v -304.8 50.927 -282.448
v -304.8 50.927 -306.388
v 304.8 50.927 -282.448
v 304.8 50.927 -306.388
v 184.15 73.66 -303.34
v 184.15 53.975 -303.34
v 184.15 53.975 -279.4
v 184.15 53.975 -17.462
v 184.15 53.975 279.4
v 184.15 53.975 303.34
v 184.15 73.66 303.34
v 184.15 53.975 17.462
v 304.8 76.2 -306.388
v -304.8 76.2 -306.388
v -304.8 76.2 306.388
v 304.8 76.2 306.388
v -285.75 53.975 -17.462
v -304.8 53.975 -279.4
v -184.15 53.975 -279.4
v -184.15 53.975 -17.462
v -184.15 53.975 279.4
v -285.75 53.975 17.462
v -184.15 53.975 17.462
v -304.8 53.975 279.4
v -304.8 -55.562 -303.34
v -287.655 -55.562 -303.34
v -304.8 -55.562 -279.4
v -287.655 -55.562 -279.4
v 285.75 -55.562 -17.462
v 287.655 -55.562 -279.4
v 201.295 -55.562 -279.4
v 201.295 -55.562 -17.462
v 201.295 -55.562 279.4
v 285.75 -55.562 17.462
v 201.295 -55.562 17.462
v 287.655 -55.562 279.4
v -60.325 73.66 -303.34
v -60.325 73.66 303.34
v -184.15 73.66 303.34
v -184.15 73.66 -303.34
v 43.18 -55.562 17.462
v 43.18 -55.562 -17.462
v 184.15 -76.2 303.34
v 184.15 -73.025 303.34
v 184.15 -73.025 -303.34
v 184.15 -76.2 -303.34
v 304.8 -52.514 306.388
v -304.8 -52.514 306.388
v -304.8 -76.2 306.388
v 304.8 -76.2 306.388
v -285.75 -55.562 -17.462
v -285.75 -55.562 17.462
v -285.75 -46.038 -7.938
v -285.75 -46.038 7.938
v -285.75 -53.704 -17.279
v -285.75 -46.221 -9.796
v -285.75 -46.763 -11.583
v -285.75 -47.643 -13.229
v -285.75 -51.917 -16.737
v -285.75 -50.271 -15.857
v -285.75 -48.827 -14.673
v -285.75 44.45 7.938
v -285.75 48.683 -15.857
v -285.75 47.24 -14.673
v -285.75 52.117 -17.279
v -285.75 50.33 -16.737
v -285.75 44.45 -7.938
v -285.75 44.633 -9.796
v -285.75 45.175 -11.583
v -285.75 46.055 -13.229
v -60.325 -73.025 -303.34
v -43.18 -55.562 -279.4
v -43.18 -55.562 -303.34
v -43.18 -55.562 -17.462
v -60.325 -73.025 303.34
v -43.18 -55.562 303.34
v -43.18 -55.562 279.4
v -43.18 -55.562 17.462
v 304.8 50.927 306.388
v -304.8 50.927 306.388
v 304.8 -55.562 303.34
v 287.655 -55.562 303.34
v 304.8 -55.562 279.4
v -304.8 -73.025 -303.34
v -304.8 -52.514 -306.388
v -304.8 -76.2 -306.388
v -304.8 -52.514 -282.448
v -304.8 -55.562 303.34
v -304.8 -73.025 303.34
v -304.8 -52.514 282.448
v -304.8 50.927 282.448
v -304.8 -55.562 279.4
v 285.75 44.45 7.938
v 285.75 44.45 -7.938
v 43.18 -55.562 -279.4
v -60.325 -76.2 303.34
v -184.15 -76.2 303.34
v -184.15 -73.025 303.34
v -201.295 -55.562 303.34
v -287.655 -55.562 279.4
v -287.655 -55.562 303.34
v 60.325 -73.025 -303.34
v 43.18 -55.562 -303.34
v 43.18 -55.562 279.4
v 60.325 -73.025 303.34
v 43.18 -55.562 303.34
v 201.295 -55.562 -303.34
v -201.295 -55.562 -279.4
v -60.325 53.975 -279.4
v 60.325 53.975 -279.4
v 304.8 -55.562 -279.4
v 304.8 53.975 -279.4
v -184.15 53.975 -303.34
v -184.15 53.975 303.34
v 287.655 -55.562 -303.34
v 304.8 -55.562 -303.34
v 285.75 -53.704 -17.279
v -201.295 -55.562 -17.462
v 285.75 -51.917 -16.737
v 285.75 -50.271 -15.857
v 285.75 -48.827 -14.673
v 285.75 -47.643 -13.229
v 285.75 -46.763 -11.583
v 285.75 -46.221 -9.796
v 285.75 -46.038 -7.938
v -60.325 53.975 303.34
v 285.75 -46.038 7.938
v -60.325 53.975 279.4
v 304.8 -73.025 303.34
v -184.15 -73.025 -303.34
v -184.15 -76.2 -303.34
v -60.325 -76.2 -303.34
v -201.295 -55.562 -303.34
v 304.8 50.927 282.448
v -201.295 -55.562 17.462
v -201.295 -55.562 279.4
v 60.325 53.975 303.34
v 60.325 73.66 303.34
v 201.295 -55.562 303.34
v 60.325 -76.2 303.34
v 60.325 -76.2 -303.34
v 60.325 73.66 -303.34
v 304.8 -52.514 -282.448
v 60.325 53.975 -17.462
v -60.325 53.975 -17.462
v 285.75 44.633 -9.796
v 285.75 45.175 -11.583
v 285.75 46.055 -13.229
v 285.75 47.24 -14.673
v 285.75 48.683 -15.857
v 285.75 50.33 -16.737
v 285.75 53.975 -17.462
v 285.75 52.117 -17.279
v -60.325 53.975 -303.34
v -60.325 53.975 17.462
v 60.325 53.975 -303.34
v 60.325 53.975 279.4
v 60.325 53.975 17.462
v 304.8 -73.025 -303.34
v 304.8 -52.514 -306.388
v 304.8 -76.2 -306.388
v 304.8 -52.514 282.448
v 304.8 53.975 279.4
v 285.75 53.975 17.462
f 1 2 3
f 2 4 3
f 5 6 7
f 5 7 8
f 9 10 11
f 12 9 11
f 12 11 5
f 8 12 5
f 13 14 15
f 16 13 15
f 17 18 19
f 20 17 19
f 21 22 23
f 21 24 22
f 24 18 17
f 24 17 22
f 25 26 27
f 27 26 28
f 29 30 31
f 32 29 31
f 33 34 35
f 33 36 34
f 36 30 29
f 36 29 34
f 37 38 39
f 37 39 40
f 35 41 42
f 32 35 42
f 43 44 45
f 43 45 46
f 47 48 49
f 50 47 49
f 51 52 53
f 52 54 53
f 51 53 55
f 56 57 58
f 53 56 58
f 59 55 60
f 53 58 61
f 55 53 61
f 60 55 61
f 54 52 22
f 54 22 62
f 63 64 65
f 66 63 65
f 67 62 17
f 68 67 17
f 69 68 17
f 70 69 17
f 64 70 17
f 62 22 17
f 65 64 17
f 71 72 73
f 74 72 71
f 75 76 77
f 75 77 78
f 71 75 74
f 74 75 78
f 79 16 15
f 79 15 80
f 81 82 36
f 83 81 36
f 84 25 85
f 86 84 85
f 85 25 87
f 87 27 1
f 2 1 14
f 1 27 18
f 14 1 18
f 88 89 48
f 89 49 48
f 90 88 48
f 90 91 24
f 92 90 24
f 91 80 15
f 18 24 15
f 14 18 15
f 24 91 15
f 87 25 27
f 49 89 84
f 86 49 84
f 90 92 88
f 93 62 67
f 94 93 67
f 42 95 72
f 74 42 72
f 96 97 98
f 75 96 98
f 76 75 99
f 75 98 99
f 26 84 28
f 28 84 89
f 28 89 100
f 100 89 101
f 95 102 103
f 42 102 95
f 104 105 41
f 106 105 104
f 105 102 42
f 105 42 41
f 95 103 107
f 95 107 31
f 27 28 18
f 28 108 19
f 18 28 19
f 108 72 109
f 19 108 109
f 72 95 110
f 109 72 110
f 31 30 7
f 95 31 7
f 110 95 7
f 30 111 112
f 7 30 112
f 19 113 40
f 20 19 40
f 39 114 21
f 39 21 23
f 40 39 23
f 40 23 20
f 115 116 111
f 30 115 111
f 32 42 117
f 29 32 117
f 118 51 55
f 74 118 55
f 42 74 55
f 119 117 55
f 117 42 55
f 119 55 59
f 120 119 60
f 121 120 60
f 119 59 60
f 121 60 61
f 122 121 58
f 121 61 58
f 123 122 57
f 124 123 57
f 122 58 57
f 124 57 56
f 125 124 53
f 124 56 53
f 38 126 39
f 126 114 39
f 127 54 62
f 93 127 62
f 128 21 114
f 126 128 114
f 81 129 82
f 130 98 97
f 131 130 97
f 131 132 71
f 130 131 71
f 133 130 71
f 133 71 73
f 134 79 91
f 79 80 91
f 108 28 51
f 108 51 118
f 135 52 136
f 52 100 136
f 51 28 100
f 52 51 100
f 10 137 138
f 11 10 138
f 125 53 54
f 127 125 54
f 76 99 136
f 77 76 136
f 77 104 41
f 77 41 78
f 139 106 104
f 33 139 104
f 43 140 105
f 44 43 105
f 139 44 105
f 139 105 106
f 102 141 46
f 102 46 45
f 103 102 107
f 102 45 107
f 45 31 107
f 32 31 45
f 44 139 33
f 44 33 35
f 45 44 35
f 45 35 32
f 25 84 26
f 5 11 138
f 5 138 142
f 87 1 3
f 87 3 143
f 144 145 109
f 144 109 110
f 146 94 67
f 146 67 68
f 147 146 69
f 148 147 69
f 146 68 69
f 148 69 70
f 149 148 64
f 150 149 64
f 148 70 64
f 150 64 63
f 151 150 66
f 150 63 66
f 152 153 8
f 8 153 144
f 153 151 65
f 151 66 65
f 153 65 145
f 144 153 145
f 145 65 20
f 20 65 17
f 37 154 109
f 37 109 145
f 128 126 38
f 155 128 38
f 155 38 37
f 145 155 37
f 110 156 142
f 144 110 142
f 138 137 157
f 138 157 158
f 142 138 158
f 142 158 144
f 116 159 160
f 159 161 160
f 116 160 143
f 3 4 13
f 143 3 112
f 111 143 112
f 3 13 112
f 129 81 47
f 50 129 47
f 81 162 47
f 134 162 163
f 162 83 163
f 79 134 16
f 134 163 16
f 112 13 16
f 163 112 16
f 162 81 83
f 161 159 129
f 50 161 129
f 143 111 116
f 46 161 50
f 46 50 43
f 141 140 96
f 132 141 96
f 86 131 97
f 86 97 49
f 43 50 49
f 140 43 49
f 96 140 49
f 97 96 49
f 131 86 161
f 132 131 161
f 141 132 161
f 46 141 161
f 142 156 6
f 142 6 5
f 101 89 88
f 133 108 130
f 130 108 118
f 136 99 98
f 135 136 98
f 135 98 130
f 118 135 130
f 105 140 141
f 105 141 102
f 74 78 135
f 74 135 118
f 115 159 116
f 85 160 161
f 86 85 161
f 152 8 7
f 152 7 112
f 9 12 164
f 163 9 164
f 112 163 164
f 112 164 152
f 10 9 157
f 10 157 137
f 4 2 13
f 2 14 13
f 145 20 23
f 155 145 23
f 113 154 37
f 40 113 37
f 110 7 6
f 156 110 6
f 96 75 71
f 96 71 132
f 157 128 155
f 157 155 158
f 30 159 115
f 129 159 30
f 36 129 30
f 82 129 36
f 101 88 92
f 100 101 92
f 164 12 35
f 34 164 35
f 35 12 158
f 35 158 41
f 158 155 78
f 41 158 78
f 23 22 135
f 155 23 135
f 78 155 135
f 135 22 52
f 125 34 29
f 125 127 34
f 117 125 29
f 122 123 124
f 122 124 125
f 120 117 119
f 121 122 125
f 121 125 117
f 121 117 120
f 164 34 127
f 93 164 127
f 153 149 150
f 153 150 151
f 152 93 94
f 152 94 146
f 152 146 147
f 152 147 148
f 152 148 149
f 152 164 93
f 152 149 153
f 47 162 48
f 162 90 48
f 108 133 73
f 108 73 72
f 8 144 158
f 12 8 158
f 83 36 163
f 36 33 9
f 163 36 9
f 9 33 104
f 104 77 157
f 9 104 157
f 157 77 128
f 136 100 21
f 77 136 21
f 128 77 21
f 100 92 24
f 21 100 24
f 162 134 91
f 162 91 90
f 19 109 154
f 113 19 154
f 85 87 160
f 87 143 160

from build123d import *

# Parameters (mm, degrees)
BOSS_EXTRUDE1_DEPTH      = 306.3875
BOSS_EXTRUDE1_2_DEPTH    = 306.3875
BOSS_EXTRUDE1_3_DEPTH    = 306.3875
SKETCH3_W                = 120.65
SKETCH3_H                = 19.685
BOSS_EXTRUDE1_4_DEPTH    = 306.3875
LPATTERN1_COUNT          = 3
LPATTERN1_PITCH          = 244.475
BOSS_EXTRUDE2_DEPTH      = 304.8
SKETCH5_W                = 606.679
SKETCH5_H                = 2.54
BOSS_EXTRUDE3_DEPTH      = 609.6
BOSS_EXTRUDE4_DEPTH      = 285.75
BOSS_EXTRUDE4_DEPTH_BACK = 285.75


with BuildPart() as part:
    # Sketch3 → Boss-Extrude1 (new, symmetric)
    with BuildSketch(Plane.XY):
        Polygon((-304.8, -76.2), (-304.8, -73.025), (-287.655, -55.5625), (-201.295, -55.5625), (-184.15, -73.025), (-184.15, -76.2), align=None)
    extrude(amount=BOSS_EXTRUDE1_DEPTH, both=True)



with BuildPart() as body_2:
    # Sketch3 → Boss-Extrude1 2 (new, symmetric)
    with BuildSketch(Plane.XY):
        Polygon((184.15, -73.025), (184.15, -76.2), (304.8, -76.2), (304.8, -73.025), (287.655, -55.5625), (201.295, -55.5625), align=None)
    extrude(amount=BOSS_EXTRUDE1_2_DEPTH, both=True)


with BuildPart() as body_3:
    # Sketch3 → Boss-Extrude1 3 (new, symmetric)
    with BuildSketch(Plane.XY):
        Polygon((-60.325, -76.2), (60.325, -76.2), (60.325, -73.025), (43.18, -55.5625), (-43.18, -55.5625), (-60.325, -73.025), align=None)
    extrude(amount=BOSS_EXTRUDE1_3_DEPTH, both=True)


with BuildPart() as body_4:
    # Sketch3 → Boss-Extrude1 4 (new, symmetric)
    with BuildSketch(Plane.XY):
        with Locations((-244.475, 63.8175)):
            Rectangle(SKETCH3_W, SKETCH3_H)
    extrude(amount=BOSS_EXTRUDE1_4_DEPTH, both=True)


with BuildPart() as lpattern1_1:
    # LPattern1: pattern copy
    add(body_4.part.moved(Location(Vector(1, 0, 0) * (1 * LPATTERN1_PITCH))))


with BuildPart() as lpattern1_2:
    # LPattern1: pattern copy
    add(body_4.part.moved(Location(Vector(1, 0, 0) * (2 * LPATTERN1_PITCH))))


with BuildPart() as part_1:
    add(part.part)

    add(body_2.part)  # Boss-Extrude2 merges body 2

    add(body_3.part)  # Boss-Extrude2 merges body 3

    add(body_4.part)  # Boss-Extrude2 merges body 4

    add(lpattern1_1.part)  # Boss-Extrude2 merges LPattern1_1

    add(lpattern1_2.part)  # Boss-Extrude2 merges LPattern1_2
    # Sketch4 → Boss-Extrude2 (add, symmetric)
    with BuildSketch(Plane(origin=(0, 0, 0), x_dir=(0, 0, -1), z_dir=(1, 0, 0))):
        Polygon((-306.3875, 76.2), (-306.3875, 50.927), (-282.448, 50.927), (-282.448, -52.5145), (-306.3875, -52.5145), (-306.3875, -76.2), (-303.3395, -76.2), (-303.3395, -55.5625), (-279.4, -55.5625), (-279.4, 53.975), (-303.3395, 53.975), (-303.3395, 76.2), align=None)
        Polygon((303.3395, 53.975), (303.3395, 76.2), (306.3875, 76.2), (306.3875, 50.927), (282.448, 50.927), (282.448, -52.5145), (306.3875, -52.5145), (306.3875, -76.2), (303.3395, -76.2), (303.3395, -55.5625), (279.4, -55.5625), (279.4, 53.975), align=None)
    extrude(amount=BOSS_EXTRUDE2_DEPTH, both=True)

    # Sketch5 → Boss-Extrude3 (add)
    with BuildSketch(Plane(origin=(304.8, 0, 0), x_dir=(0, 0, -1), z_dir=(1, 0, 0))):
        with Locations((0, 74.93)):
            Rectangle(SKETCH5_W, SKETCH5_H)
    extrude(amount=-BOSS_EXTRUDE3_DEPTH)

    # Sketch6 → Boss-Extrude4 (add, two sides: drawn at the far end of the back side and taken through both)
    with BuildSketch(Plane(origin=(0, 0, 0), x_dir=(0, 0, -1), z_dir=(1, 0, 0)).offset(-BOSS_EXTRUDE4_DEPTH_BACK)):
        with BuildLine():
            Line((-17.4625, 53.975), (-17.4625, -55.5625))
            Line((-17.4625, -55.5625), (17.4625, -55.5625))
            ThreePointArc((17.4625, -55.5625), (14.672692091, -48.827307909), (7.9375, -46.0375))
            Line((7.9375, -46.0375), (-7.9375, -46.0375))
            Line((-7.9375, -46.0375), (-7.9375, 44.45))
            Line((-7.9375, 44.45), (7.9375, 44.45))
            ThreePointArc((7.9375, 44.45), (14.672692091, 47.239807909), (17.4625, 53.975))
            Line((17.4625, 53.975), (-17.4625, 53.975))
        make_face()
    extrude(amount=BOSS_EXTRUDE4_DEPTH + BOSS_EXTRUDE4_DEPTH_BACK)


solid = part_1.part
